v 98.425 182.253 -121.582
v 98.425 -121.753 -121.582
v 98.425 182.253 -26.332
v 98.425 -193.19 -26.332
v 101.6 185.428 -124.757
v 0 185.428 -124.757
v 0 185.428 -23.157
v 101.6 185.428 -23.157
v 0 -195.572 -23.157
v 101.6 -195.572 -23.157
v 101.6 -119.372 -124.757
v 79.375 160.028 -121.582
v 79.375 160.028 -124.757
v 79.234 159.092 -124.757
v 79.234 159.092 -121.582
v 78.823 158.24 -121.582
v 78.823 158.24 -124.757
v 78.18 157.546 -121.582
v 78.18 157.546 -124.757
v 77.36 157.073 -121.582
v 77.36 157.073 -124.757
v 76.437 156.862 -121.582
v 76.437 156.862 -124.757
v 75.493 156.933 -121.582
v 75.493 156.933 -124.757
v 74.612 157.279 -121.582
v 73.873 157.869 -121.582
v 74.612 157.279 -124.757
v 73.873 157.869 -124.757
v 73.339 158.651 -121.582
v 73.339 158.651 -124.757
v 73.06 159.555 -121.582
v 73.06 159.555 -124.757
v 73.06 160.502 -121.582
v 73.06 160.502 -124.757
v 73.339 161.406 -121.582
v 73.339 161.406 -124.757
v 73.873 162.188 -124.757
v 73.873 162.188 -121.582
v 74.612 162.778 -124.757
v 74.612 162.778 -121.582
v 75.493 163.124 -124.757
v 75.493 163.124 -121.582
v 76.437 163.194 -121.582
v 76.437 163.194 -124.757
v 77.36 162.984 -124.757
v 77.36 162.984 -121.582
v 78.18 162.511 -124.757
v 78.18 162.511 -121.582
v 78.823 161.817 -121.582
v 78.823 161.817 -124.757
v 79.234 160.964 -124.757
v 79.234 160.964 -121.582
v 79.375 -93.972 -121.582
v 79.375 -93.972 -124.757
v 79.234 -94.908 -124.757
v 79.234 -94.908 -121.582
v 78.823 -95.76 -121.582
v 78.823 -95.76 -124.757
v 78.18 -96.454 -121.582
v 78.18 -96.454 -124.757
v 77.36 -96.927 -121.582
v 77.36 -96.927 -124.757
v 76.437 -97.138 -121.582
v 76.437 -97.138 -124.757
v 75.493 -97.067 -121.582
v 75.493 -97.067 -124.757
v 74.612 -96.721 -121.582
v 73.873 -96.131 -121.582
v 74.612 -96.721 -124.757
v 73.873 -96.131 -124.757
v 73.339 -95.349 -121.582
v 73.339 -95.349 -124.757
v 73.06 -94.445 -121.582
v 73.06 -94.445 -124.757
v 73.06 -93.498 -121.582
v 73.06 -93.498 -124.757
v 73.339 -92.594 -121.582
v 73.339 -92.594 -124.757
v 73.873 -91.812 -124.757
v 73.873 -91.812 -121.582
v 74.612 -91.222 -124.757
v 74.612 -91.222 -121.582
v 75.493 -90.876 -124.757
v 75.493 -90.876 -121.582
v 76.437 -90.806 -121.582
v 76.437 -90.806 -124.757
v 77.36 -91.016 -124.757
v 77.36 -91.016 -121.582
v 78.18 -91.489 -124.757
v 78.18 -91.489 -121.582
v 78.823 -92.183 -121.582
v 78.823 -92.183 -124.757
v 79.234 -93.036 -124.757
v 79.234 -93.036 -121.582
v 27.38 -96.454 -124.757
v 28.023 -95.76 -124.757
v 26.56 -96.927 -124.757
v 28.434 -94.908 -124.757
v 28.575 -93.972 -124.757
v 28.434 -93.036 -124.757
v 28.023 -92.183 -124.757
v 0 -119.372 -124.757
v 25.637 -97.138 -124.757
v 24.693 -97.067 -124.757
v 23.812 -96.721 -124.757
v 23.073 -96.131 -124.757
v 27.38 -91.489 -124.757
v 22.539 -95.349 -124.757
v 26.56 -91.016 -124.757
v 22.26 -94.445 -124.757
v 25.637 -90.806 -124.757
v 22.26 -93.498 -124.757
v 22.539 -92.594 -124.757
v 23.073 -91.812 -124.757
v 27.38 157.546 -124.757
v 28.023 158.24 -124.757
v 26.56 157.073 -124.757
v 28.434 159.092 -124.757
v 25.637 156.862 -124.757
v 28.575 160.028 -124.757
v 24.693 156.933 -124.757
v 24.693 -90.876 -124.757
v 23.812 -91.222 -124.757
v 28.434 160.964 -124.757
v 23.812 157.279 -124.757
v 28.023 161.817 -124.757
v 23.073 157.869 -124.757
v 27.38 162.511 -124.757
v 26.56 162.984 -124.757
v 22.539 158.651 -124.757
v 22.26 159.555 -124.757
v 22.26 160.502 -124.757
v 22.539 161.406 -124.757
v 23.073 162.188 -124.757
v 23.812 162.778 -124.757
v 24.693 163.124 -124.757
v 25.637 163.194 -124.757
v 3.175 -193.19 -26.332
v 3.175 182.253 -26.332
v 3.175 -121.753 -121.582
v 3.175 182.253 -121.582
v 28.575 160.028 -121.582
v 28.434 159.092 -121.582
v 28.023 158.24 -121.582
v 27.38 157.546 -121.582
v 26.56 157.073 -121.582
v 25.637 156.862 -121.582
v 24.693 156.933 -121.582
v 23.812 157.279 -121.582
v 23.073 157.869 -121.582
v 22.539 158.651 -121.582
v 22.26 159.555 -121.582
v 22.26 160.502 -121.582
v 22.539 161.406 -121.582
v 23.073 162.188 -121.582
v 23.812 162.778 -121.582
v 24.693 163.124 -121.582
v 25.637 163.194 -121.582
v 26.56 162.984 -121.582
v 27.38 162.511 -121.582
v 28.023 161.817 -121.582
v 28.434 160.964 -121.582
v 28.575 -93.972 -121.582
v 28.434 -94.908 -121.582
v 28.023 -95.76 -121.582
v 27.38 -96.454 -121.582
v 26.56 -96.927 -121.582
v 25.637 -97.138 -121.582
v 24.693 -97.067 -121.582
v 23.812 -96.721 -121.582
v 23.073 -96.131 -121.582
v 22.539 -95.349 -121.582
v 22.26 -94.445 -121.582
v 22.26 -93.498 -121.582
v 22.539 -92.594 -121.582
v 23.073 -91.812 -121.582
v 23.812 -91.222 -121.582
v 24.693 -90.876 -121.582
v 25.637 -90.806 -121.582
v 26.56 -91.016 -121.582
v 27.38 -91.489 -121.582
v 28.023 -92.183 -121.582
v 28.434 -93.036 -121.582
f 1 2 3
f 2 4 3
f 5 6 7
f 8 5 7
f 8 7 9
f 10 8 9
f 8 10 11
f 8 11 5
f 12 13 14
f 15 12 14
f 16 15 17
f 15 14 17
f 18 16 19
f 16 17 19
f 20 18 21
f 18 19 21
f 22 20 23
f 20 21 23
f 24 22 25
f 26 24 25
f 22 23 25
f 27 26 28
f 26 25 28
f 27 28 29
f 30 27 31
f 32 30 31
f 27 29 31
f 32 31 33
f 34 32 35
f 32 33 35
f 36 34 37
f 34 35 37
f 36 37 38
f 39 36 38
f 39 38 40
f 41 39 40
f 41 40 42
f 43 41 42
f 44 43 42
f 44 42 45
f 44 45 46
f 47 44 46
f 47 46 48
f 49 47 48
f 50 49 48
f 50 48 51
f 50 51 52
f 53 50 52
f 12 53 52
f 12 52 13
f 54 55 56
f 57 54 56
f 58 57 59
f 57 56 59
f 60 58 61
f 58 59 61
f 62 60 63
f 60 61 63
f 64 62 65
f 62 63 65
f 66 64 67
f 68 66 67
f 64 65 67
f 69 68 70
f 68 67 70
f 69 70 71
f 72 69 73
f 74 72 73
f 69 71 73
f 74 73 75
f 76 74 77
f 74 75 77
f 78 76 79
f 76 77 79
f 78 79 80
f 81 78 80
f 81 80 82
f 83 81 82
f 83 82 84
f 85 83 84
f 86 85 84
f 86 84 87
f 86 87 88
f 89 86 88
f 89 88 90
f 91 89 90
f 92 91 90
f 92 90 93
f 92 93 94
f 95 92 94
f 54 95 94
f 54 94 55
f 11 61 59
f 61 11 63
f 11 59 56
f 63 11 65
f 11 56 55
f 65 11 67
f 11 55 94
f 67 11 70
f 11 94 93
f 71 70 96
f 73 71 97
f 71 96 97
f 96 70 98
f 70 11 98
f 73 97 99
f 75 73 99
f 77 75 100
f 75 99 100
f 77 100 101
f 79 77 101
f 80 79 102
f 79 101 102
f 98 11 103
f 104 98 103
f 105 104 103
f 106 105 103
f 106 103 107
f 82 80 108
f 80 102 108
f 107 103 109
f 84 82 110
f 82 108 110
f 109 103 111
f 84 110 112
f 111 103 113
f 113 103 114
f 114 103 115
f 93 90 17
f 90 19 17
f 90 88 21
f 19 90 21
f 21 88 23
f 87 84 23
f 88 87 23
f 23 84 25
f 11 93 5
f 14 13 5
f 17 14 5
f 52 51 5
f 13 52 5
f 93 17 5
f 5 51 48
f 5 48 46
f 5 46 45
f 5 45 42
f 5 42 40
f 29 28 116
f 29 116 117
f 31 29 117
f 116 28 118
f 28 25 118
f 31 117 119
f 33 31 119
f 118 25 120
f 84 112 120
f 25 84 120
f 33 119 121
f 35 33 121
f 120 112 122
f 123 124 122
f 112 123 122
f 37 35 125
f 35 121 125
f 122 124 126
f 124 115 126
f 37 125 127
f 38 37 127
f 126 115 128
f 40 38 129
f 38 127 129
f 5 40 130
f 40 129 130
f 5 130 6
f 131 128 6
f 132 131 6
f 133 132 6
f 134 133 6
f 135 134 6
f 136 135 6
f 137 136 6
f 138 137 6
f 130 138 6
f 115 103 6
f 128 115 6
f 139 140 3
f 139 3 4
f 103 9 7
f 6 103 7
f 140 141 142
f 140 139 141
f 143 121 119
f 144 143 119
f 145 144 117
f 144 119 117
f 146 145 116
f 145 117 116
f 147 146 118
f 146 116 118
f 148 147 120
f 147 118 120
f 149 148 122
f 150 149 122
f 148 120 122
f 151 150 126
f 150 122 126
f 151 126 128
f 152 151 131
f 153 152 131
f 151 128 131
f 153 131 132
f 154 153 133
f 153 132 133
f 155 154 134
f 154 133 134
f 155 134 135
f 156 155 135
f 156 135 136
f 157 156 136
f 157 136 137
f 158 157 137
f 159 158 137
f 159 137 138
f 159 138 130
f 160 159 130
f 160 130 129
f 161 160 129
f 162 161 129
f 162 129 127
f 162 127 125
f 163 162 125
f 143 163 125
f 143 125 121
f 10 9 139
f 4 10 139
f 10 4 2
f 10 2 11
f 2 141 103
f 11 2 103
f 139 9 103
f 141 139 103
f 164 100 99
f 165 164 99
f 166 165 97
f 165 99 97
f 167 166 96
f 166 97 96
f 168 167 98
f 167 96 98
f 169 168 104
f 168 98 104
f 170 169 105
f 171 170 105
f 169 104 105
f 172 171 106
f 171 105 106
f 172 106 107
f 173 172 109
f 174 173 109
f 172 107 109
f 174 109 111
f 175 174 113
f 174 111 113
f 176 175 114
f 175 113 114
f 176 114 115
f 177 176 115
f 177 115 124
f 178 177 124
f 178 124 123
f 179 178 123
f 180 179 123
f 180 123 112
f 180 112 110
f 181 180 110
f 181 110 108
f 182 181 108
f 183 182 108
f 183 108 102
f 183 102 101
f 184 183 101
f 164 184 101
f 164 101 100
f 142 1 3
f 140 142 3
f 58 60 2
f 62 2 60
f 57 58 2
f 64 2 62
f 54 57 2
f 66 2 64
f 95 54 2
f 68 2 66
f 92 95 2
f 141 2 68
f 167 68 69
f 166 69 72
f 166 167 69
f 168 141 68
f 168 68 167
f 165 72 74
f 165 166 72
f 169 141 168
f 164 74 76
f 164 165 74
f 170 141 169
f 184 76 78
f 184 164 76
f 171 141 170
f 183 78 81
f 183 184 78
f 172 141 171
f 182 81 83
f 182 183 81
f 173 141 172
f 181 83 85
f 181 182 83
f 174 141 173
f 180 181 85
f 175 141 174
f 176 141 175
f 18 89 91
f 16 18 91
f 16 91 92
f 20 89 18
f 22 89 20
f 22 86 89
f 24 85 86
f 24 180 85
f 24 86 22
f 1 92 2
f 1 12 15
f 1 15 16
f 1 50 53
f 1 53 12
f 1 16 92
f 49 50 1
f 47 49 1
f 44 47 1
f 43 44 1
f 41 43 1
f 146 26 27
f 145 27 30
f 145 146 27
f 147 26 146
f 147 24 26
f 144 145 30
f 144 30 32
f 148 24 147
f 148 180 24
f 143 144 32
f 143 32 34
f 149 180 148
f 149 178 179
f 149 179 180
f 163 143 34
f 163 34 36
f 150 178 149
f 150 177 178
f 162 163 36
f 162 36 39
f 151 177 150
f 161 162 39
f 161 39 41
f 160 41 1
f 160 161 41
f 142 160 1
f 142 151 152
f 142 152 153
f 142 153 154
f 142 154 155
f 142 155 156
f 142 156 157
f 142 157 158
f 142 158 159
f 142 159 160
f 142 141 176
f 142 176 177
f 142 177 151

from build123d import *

# Parameters (mm, degrees)
F1_DEPTH = 101.6
F2_T     = -3.175
F3_R     = 3.175
F4_DEPTH = 25.4


with BuildPart() as f1:
    # F0 (on Right) → F1 (new body)
    with BuildSketch(Plane.YZ):
        Polygon((185.428325, -23.156608), (-195.571675, -23.156608), (-119.371675, -124.756608), (185.428325, -124.756608), align=None)
    extrude(amount=F1_DEPTH)

    # F2
    f2_openings = [f1.faces().sort_by_distance(p)[0] for p in [
        (50.8, -157.471675, -73.956608),
    ]]
    offset(amount=F2_T, openings=f2_openings)

    # F3 (on face) → F4 (cut)
    with BuildSketch(Plane(origin=(0, 0, -124.756608), x_dir=(1, 0, 0), z_dir=(0, 0, -1))):
        with Locations((25.4, 93.971675)):
            Circle(F3_R)
        with Locations((76.2, 93.971675)):
            Circle(F3_R)
        with Locations((25.4, -160.028325)):
            Circle(F3_R)
        with Locations((76.2, -160.028325)):
            Circle(F3_R)
    extrude(amount=-F4_DEPTH, mode=Mode.SUBTRACT)


solid = f1.part
